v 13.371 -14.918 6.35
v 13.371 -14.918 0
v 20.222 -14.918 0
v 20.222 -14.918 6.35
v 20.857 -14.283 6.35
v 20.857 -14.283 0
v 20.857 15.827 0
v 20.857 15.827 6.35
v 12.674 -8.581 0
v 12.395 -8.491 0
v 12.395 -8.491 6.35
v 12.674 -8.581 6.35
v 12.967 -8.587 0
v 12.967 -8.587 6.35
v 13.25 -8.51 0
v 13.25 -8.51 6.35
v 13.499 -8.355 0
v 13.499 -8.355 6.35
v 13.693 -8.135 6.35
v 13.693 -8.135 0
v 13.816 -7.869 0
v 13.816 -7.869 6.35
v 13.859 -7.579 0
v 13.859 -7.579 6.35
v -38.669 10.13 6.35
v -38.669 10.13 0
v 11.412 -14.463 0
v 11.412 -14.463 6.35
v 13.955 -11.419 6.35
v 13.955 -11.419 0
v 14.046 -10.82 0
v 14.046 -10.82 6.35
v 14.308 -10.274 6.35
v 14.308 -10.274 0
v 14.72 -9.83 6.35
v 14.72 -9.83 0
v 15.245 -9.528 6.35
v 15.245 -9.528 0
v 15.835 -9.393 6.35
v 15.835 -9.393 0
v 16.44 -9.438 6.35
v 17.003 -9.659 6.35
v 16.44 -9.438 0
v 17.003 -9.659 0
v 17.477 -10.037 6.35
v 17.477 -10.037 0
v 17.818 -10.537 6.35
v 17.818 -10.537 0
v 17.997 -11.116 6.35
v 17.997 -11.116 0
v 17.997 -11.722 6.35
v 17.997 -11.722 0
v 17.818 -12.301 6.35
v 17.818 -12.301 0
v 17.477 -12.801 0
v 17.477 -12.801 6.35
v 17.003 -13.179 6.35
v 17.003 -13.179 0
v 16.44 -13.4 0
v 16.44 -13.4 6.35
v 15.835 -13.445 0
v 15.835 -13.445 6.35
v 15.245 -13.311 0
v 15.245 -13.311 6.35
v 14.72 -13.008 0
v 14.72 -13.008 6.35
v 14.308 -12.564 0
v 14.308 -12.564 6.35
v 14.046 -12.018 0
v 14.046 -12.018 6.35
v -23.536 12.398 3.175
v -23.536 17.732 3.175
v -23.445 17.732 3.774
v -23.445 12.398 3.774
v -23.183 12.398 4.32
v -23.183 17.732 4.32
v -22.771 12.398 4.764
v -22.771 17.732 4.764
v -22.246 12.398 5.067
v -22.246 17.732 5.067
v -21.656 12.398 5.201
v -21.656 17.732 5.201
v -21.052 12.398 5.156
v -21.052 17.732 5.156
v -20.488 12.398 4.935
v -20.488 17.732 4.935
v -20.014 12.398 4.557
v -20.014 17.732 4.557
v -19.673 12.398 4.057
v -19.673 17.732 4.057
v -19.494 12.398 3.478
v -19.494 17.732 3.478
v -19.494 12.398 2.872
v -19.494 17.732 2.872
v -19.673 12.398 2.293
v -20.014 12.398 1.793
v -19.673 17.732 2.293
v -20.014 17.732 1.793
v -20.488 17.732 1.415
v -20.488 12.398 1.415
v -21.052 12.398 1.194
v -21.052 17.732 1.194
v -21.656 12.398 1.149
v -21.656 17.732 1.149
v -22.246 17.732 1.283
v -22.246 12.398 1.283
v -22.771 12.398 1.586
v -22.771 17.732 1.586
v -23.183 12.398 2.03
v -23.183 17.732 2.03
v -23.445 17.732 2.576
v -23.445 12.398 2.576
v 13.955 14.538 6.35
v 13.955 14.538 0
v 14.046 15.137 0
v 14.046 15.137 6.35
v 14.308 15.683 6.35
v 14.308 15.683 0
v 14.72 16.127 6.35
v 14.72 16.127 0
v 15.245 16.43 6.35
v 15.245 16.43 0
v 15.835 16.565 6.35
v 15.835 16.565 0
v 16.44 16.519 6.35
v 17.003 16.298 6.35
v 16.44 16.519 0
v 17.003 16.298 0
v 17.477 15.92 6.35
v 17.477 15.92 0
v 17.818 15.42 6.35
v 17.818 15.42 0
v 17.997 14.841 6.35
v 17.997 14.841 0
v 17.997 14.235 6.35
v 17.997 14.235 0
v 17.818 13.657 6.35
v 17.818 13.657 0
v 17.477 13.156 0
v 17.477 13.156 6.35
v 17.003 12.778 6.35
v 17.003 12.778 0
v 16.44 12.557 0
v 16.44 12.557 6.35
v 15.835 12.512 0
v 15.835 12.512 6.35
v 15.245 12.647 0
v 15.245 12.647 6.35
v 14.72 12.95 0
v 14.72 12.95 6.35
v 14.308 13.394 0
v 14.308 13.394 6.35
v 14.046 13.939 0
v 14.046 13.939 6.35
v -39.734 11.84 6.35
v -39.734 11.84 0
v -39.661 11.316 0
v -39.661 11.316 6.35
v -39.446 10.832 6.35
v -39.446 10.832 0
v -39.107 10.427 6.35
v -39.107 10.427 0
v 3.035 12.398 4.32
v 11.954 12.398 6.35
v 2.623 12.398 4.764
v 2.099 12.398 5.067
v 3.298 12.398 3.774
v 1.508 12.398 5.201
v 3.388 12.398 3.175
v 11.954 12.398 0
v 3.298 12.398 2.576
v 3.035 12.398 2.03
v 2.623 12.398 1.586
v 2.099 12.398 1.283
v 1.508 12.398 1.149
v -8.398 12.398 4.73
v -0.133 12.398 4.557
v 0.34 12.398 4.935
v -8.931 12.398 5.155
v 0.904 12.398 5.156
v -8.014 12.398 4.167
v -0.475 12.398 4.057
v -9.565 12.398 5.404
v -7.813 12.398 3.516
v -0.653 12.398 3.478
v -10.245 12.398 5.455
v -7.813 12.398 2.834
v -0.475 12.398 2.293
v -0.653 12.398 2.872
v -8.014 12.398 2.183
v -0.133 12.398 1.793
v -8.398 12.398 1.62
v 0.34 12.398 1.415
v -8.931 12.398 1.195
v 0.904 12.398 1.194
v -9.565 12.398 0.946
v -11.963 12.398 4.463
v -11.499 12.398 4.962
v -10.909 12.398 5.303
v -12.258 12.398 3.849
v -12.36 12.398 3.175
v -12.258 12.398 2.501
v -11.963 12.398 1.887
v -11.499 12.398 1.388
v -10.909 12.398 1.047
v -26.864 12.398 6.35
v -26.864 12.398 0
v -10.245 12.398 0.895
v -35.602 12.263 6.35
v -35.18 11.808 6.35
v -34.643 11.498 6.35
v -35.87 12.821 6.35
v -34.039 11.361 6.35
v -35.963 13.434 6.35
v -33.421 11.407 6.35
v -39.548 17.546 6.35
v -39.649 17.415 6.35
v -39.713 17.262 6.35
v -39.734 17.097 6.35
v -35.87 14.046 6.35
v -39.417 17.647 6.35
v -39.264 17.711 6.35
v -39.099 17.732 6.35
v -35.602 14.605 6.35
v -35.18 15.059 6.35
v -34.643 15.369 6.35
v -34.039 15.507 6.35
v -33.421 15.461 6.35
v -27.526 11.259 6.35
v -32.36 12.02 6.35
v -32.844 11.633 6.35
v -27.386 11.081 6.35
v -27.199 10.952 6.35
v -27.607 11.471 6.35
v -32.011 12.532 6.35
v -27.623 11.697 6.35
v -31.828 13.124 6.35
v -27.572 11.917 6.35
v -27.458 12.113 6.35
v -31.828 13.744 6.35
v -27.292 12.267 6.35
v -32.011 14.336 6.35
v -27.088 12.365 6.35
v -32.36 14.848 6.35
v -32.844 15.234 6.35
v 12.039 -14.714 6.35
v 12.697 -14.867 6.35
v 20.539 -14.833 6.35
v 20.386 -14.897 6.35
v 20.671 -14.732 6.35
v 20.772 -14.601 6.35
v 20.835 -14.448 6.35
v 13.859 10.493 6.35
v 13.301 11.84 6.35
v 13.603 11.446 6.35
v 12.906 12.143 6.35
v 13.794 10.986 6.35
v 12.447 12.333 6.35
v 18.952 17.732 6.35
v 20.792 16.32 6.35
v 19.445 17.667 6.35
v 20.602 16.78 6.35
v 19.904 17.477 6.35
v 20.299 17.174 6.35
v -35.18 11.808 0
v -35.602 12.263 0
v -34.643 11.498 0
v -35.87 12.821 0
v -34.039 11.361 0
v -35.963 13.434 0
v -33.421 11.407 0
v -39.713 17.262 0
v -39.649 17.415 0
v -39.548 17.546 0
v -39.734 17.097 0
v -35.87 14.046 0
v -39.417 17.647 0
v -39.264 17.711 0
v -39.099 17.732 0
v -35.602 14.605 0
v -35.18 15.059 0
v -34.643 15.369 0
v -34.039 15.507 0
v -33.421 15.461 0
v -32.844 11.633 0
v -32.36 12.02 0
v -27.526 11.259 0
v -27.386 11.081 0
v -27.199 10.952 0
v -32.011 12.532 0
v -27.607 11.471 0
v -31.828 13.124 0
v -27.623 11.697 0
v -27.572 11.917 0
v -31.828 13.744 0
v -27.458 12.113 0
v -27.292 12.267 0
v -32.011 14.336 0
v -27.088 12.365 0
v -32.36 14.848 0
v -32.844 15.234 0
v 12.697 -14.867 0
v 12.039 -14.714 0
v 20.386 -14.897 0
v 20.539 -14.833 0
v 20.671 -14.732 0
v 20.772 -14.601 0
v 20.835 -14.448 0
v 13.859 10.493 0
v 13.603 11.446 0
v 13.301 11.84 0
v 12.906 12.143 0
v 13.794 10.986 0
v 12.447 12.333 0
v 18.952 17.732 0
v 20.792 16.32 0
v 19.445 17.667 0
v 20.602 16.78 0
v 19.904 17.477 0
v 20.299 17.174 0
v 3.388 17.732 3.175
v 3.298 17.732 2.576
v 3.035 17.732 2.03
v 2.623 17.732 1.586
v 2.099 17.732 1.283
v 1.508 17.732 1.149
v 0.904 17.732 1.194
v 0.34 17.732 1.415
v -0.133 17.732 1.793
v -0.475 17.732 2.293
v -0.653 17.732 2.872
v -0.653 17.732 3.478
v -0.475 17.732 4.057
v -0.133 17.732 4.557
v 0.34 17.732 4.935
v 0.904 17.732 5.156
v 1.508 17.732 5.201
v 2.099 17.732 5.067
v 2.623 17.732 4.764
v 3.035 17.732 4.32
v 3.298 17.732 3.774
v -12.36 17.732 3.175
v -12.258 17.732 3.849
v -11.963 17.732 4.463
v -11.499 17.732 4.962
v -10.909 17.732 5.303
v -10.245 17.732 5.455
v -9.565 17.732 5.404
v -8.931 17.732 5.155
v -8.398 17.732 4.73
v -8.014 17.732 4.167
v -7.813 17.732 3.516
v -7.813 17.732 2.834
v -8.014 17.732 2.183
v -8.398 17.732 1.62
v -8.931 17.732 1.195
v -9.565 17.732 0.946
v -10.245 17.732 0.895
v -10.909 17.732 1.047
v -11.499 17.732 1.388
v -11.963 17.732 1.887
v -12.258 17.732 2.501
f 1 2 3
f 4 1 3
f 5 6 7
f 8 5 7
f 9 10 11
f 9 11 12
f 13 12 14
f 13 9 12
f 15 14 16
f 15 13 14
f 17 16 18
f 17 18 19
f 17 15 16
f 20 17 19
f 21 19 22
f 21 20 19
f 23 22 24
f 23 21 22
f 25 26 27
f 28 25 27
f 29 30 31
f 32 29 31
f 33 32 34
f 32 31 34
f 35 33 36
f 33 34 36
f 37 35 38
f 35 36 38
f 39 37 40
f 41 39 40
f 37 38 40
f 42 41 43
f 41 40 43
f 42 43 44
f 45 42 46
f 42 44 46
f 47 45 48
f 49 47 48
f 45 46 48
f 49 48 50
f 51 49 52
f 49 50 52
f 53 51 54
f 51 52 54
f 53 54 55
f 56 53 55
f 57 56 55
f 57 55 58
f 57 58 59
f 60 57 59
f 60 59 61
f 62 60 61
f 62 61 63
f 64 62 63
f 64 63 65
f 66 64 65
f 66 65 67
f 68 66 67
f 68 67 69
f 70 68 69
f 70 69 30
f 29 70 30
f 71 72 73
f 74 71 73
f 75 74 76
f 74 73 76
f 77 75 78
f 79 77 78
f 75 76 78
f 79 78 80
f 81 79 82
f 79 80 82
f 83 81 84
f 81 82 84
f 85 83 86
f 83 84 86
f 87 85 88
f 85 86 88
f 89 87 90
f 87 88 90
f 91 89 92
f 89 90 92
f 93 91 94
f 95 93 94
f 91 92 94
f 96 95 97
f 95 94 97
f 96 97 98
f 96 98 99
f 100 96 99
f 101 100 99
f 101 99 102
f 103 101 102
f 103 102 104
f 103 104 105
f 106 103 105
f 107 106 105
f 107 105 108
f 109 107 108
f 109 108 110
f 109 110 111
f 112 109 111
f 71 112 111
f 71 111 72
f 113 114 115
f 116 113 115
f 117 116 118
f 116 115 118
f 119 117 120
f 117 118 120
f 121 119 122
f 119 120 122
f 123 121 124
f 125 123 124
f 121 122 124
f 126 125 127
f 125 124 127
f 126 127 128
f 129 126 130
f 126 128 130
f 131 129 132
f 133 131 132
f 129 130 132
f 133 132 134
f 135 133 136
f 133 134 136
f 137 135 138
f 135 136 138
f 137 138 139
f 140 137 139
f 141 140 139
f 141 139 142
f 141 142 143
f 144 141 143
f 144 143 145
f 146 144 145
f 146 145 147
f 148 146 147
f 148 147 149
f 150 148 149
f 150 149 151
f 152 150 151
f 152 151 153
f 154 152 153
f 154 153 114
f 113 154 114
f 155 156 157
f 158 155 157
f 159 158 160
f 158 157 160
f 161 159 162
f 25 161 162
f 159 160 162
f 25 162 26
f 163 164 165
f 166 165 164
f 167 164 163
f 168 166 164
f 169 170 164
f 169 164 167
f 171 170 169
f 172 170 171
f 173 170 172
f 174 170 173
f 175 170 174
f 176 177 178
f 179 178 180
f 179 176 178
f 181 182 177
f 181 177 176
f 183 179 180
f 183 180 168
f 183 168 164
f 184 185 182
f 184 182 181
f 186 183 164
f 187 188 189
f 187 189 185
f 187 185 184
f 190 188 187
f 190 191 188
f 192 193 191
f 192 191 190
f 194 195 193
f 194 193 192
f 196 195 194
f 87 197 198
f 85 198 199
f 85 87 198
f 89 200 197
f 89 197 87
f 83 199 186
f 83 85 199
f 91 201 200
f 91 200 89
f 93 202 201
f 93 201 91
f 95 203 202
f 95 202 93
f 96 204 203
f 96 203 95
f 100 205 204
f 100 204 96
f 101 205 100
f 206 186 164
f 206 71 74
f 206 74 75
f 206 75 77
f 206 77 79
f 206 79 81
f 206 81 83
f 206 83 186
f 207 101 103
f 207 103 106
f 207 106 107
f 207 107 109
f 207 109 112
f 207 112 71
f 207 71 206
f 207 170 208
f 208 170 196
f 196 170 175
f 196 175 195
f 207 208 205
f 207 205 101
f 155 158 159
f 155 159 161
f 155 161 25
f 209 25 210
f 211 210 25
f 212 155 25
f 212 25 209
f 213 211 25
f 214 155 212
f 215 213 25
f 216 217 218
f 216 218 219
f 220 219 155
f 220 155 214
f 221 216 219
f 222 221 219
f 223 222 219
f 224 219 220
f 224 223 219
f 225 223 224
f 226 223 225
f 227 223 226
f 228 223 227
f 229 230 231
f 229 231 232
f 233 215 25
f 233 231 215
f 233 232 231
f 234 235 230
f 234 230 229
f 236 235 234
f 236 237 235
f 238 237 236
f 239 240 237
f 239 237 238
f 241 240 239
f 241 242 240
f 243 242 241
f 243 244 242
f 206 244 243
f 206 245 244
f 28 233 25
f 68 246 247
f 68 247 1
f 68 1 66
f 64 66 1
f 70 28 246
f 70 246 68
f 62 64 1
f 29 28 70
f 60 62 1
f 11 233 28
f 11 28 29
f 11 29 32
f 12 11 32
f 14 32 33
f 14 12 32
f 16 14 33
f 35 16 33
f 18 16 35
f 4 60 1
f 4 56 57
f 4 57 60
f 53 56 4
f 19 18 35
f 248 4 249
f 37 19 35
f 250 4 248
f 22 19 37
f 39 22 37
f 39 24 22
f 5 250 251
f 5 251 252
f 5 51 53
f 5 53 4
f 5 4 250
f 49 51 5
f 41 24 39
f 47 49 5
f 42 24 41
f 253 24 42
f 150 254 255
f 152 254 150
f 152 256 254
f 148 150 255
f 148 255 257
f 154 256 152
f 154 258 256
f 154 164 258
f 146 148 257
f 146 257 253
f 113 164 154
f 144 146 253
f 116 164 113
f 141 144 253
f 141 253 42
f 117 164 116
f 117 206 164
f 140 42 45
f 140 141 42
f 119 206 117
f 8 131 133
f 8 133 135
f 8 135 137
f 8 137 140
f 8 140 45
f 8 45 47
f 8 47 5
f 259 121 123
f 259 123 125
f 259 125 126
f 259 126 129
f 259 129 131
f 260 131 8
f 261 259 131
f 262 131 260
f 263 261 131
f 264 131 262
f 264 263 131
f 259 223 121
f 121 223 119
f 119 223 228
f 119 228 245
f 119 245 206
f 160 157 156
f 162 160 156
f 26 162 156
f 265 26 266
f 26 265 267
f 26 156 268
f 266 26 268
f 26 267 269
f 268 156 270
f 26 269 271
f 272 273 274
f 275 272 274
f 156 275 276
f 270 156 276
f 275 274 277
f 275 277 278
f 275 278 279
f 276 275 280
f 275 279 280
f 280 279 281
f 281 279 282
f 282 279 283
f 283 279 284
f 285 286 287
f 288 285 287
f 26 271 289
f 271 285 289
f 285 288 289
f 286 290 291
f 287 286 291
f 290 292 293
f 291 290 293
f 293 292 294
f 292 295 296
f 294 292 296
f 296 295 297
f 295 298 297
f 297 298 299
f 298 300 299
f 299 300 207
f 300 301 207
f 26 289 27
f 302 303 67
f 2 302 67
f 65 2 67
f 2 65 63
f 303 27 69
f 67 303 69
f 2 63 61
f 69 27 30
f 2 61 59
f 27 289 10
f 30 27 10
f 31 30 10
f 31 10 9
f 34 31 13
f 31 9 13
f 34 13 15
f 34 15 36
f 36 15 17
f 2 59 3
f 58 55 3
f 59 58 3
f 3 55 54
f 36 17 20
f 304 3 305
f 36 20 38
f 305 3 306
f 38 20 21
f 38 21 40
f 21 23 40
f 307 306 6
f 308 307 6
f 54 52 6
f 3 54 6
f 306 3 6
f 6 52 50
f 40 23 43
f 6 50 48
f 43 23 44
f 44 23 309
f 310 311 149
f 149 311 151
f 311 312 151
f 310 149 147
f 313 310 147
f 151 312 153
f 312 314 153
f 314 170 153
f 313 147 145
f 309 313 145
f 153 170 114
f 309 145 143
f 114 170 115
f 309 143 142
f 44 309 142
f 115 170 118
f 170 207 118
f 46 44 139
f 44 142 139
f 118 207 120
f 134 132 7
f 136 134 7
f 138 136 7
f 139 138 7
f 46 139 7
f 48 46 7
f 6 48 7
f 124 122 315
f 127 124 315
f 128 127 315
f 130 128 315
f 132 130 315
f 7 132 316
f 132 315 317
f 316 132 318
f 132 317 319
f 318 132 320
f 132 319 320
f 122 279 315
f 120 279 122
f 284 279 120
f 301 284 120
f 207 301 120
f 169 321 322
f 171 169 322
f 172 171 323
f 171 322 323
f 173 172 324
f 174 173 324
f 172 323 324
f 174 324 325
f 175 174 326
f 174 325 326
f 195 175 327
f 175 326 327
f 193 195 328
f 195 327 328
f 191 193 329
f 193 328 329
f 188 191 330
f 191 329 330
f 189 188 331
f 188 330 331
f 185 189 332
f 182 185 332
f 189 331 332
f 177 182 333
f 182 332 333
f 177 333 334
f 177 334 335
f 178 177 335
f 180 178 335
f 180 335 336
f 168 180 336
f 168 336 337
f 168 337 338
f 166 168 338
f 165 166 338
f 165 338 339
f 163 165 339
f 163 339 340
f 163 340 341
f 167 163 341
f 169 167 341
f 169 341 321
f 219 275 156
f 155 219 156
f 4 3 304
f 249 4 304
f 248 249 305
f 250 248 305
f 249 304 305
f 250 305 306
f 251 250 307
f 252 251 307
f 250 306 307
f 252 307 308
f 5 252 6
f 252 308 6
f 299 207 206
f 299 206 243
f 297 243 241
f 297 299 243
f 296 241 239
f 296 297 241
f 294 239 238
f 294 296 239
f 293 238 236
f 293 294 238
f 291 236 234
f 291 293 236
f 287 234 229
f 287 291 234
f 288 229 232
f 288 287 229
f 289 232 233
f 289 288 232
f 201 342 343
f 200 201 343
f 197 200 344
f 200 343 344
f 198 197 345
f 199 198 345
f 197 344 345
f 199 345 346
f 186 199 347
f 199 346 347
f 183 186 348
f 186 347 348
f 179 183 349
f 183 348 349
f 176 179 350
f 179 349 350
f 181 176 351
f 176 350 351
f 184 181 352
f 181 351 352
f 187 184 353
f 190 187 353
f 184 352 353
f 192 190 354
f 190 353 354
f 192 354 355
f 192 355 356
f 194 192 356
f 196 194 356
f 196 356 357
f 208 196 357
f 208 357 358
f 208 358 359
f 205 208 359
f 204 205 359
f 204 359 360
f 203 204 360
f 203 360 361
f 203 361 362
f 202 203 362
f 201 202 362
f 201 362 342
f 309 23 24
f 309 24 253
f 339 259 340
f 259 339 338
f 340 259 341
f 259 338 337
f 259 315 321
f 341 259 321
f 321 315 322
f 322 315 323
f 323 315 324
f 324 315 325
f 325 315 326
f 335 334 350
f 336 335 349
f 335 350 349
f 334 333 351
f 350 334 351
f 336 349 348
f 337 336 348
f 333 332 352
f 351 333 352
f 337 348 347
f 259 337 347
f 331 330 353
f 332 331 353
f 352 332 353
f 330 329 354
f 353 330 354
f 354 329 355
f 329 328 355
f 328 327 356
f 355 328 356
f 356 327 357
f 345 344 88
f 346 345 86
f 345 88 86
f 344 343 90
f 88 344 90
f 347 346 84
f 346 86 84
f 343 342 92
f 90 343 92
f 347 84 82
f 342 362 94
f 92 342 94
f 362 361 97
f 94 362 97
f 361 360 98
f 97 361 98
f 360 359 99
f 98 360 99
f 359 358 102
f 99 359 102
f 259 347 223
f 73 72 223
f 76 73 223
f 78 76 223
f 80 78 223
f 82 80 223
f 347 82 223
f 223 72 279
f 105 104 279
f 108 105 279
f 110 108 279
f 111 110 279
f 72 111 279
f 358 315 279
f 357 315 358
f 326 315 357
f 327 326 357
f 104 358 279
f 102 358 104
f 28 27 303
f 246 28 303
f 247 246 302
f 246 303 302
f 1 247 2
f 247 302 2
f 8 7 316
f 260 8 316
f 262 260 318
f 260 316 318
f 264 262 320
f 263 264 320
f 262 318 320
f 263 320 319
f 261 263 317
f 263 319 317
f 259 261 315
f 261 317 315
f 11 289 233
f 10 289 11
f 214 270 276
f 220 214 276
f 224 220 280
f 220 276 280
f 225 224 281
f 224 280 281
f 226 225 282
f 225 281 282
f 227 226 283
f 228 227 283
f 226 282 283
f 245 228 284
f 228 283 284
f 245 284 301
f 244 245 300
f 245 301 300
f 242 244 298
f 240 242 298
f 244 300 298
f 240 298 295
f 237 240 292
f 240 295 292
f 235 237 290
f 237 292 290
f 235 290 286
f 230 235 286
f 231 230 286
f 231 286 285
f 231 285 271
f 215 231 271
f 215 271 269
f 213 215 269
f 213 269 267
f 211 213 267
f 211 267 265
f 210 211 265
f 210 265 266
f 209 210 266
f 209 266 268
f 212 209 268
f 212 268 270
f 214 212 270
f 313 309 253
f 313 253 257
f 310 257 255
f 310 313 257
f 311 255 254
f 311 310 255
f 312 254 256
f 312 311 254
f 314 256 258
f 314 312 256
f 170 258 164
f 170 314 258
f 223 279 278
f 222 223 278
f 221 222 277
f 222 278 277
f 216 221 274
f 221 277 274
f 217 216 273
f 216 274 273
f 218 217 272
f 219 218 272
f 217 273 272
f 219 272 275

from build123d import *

# Parameters (mm, degrees)
BOSS_EXTRUDE1_DEPTH = 6.35
SKETCH5_R           = 2.032
CUT_EXTRUDE4_DEPTH  = 6.858
SKETCH6_R           = 2.286
CUT_EXTRUDE5_DEPTH  = 6.858
SKETCH7_R           = 2.078963723
SKETCH7_R_2         = 2.032
CUT_EXTRUDE6_DEPTH  = 44.972372637


with BuildPart() as part:
    # Sketch1 → Boss-Extrude1 (new body)
    with BuildSketch(Plane.XY):
        with BuildLine():
            Line((-39.734260423, 17.097332163), (-39.734260423, 11.839639722))
            ThreePointArc((-39.734260423, 11.839639722), (-39.446147588, 10.832316092), (-38.668957645, 10.129688385))
            Line((-38.668957645, 10.129688385), (11.411717792, -14.463177564))
            ThreePointArc((11.411717792, -14.463177564), (12.365282789, -14.803018024), (13.371011309, -14.91829111))
            Line((13.371011309, -14.91829111), (20.221726652, -14.91829111))
            ThreePointArc((20.221726652, -14.91829111), (20.670739459, -14.732303916), (20.856726652, -14.28329111))
            Line((20.856726652, -14.28329111), (20.856726652, 15.827332163))
            ThreePointArc((20.856726652, 15.827332163), (20.298765071, 17.174370581), (18.951726652, 17.732332163))
            Line((18.951726652, 17.732332163), (-39.099260423, 17.732332163))
            ThreePointArc((-39.099260423, 17.732332163), (-39.548273229, 17.546344969), (-39.734260423, 17.097332163))
        make_face()
        with BuildLine():
            Line((13.858514745, -7.578979228), (13.858514745, 10.493332163))
            ThreePointArc((13.858514745, 10.493332163), (13.300553163, 11.840370581), (11.953514745, 12.398332163))
            Line((11.953514745, 12.398332163), (-26.863603786, 12.398332163))
            ThreePointArc((-26.863603786, 12.398332163), (-27.605842685, 11.808742766), (-27.199482675, 10.952351628))
            Line((-27.199482675, 10.952351628), (12.394676227, -8.490953274))
            ThreePointArc((12.394676227, -8.490953274), (13.379754015, -8.441319049), (13.858514745, -7.578979228))
        make_face(mode=Mode.SUBTRACT)
    extrude(amount=BOSS_EXTRUDE1_DEPTH)

    # Sketch5 → Cut-Extrude4 (cut)
    with BuildSketch(Plane(origin=(0, 17.732332163, 0), x_dir=(1, 0, 0), z_dir=(0, 1, 0))):
        with Locations(Location((-21.503766885, -3.175, 0), (0, 0, 180))):
            Circle(SKETCH5_R)
        with Locations((1.356233115, -3.175)):
            Circle(SKETCH5_R)
    extrude(amount=-CUT_EXTRUDE4_DEPTH, mode=Mode.SUBTRACT)

    # Sketch6 → Cut-Extrude5 (cut)
    with BuildSketch(Plane(origin=(0, 17.732332163, 0), x_dir=(1, 0, 0), z_dir=(0, 1, 0))):
        with Locations(Location((-10.073766885, -3.175, 0), (0, 0, 180))):
            Circle(SKETCH6_R)
    extrude(amount=-CUT_EXTRUDE5_DEPTH, mode=Mode.SUBTRACT)

    # Sketch7 → Cut-Extrude6 (cut, through all)
    with BuildSketch(Plane(origin=(0, 0, 0), x_dir=(-1, 0, 0), z_dir=(0, 0, -1))):
        with Locations((33.883843897, 13.433671695)):
            Circle(SKETCH7_R)
        with Locations((-15.98734669, 14.538238486)):
            Circle(SKETCH7_R_2)
        with Locations((-15.98734669, -11.419081089)):
            Circle(SKETCH7_R_2)
    extrude(amount=-CUT_EXTRUDE6_DEPTH, mode=Mode.SUBTRACT)


solid = part.part
